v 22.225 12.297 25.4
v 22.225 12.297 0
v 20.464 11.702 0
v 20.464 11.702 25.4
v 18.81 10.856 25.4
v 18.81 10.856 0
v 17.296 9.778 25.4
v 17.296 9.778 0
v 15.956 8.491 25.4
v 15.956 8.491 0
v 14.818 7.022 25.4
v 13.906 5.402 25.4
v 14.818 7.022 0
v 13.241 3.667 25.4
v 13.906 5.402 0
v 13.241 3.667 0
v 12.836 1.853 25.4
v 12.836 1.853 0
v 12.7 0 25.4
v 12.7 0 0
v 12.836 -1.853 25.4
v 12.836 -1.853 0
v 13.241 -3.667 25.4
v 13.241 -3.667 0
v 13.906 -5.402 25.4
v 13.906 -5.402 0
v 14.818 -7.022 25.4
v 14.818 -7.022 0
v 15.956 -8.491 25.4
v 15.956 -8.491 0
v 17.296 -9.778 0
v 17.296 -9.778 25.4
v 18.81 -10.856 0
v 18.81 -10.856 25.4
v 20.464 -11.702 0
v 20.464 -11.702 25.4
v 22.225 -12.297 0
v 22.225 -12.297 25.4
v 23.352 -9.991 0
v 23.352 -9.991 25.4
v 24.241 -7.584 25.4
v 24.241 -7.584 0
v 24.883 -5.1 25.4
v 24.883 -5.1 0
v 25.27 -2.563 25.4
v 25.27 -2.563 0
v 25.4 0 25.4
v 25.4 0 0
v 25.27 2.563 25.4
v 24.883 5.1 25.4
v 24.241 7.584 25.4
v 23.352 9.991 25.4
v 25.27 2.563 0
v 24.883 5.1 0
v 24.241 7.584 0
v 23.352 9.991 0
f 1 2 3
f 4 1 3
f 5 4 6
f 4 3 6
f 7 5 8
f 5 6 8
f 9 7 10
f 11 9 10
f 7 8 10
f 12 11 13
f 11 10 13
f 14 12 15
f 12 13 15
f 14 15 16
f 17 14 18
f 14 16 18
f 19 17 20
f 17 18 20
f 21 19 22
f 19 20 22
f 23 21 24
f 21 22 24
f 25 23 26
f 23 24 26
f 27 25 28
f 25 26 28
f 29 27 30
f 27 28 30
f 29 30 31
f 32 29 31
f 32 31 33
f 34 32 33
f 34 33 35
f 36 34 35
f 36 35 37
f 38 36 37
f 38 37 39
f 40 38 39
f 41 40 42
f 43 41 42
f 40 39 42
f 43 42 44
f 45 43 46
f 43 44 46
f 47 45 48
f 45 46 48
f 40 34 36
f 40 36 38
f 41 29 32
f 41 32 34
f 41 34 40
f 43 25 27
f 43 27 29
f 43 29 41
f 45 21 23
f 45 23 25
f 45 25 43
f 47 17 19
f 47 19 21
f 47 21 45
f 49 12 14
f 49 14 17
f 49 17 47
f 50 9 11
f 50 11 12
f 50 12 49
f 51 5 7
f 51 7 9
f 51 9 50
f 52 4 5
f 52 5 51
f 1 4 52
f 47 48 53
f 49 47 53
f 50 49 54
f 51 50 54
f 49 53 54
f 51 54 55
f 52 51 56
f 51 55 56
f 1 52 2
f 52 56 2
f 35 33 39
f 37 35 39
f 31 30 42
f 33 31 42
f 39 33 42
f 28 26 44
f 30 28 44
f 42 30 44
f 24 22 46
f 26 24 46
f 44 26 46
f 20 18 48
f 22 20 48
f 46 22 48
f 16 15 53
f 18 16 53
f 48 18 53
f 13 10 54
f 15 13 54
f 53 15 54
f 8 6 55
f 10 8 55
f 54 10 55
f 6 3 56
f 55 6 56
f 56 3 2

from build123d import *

# Parameters (mm, degrees)
F1_DEPTH = 25.4
F2_DEPTH = 25.4


with BuildPart() as f1:
    # F0 (on Top) → F1 (new body)
    with BuildSketch(Plane.XY):
        with BuildLine():
            ThreePointArc((22.225, -12.296722), (12.7, 0), (22.225, 12.296722))
            ThreePointArc((22.225, 12.296722), (-25.4, 0), (22.225, -12.296722))
        make_face()
        with BuildLine():
            ThreePointArc((22.225, -12.296722), (24.593444, -6.35), (25.4, 0))
            ThreePointArc((25.4, 0), (24.593444, 6.35), (22.225, 12.296722))
            ThreePointArc((22.225, 12.296722), (12.7, 0), (22.225, -12.296722))
        make_face()
    extrude(amount=F1_DEPTH)


with BuildPart() as f2:
    # F0 (on Top) → F2 (new body)
    with BuildSketch(Plane.XY):
        with BuildLine():
            ThreePointArc((22.225, 12.296722), (24.593444, 6.35), (25.4, 0))
            ThreePointArc((25.4, 0), (24.593444, -6.35), (22.225, -12.296722))
            ThreePointArc((22.225, -12.296722), (33.17713, -10.040232), (38.1, 0))
            ThreePointArc((38.1, 0), (33.17713, 10.040232), (22.225, 12.296722))
        make_face()
        with BuildLine():
            ThreePointArc((22.225, -12.296722), (24.593444, -6.35), (25.4, 0))
            ThreePointArc((25.4, 0), (24.593444, 6.35), (22.225, 12.296722))
            ThreePointArc((22.225, 12.296722), (12.7, 0), (22.225, -12.296722))
        make_face()
    extrude(amount=F2_DEPTH)

    # F3: intersect F1
    add(f1.part, mode=Mode.INTERSECT)


solid = f2.part
